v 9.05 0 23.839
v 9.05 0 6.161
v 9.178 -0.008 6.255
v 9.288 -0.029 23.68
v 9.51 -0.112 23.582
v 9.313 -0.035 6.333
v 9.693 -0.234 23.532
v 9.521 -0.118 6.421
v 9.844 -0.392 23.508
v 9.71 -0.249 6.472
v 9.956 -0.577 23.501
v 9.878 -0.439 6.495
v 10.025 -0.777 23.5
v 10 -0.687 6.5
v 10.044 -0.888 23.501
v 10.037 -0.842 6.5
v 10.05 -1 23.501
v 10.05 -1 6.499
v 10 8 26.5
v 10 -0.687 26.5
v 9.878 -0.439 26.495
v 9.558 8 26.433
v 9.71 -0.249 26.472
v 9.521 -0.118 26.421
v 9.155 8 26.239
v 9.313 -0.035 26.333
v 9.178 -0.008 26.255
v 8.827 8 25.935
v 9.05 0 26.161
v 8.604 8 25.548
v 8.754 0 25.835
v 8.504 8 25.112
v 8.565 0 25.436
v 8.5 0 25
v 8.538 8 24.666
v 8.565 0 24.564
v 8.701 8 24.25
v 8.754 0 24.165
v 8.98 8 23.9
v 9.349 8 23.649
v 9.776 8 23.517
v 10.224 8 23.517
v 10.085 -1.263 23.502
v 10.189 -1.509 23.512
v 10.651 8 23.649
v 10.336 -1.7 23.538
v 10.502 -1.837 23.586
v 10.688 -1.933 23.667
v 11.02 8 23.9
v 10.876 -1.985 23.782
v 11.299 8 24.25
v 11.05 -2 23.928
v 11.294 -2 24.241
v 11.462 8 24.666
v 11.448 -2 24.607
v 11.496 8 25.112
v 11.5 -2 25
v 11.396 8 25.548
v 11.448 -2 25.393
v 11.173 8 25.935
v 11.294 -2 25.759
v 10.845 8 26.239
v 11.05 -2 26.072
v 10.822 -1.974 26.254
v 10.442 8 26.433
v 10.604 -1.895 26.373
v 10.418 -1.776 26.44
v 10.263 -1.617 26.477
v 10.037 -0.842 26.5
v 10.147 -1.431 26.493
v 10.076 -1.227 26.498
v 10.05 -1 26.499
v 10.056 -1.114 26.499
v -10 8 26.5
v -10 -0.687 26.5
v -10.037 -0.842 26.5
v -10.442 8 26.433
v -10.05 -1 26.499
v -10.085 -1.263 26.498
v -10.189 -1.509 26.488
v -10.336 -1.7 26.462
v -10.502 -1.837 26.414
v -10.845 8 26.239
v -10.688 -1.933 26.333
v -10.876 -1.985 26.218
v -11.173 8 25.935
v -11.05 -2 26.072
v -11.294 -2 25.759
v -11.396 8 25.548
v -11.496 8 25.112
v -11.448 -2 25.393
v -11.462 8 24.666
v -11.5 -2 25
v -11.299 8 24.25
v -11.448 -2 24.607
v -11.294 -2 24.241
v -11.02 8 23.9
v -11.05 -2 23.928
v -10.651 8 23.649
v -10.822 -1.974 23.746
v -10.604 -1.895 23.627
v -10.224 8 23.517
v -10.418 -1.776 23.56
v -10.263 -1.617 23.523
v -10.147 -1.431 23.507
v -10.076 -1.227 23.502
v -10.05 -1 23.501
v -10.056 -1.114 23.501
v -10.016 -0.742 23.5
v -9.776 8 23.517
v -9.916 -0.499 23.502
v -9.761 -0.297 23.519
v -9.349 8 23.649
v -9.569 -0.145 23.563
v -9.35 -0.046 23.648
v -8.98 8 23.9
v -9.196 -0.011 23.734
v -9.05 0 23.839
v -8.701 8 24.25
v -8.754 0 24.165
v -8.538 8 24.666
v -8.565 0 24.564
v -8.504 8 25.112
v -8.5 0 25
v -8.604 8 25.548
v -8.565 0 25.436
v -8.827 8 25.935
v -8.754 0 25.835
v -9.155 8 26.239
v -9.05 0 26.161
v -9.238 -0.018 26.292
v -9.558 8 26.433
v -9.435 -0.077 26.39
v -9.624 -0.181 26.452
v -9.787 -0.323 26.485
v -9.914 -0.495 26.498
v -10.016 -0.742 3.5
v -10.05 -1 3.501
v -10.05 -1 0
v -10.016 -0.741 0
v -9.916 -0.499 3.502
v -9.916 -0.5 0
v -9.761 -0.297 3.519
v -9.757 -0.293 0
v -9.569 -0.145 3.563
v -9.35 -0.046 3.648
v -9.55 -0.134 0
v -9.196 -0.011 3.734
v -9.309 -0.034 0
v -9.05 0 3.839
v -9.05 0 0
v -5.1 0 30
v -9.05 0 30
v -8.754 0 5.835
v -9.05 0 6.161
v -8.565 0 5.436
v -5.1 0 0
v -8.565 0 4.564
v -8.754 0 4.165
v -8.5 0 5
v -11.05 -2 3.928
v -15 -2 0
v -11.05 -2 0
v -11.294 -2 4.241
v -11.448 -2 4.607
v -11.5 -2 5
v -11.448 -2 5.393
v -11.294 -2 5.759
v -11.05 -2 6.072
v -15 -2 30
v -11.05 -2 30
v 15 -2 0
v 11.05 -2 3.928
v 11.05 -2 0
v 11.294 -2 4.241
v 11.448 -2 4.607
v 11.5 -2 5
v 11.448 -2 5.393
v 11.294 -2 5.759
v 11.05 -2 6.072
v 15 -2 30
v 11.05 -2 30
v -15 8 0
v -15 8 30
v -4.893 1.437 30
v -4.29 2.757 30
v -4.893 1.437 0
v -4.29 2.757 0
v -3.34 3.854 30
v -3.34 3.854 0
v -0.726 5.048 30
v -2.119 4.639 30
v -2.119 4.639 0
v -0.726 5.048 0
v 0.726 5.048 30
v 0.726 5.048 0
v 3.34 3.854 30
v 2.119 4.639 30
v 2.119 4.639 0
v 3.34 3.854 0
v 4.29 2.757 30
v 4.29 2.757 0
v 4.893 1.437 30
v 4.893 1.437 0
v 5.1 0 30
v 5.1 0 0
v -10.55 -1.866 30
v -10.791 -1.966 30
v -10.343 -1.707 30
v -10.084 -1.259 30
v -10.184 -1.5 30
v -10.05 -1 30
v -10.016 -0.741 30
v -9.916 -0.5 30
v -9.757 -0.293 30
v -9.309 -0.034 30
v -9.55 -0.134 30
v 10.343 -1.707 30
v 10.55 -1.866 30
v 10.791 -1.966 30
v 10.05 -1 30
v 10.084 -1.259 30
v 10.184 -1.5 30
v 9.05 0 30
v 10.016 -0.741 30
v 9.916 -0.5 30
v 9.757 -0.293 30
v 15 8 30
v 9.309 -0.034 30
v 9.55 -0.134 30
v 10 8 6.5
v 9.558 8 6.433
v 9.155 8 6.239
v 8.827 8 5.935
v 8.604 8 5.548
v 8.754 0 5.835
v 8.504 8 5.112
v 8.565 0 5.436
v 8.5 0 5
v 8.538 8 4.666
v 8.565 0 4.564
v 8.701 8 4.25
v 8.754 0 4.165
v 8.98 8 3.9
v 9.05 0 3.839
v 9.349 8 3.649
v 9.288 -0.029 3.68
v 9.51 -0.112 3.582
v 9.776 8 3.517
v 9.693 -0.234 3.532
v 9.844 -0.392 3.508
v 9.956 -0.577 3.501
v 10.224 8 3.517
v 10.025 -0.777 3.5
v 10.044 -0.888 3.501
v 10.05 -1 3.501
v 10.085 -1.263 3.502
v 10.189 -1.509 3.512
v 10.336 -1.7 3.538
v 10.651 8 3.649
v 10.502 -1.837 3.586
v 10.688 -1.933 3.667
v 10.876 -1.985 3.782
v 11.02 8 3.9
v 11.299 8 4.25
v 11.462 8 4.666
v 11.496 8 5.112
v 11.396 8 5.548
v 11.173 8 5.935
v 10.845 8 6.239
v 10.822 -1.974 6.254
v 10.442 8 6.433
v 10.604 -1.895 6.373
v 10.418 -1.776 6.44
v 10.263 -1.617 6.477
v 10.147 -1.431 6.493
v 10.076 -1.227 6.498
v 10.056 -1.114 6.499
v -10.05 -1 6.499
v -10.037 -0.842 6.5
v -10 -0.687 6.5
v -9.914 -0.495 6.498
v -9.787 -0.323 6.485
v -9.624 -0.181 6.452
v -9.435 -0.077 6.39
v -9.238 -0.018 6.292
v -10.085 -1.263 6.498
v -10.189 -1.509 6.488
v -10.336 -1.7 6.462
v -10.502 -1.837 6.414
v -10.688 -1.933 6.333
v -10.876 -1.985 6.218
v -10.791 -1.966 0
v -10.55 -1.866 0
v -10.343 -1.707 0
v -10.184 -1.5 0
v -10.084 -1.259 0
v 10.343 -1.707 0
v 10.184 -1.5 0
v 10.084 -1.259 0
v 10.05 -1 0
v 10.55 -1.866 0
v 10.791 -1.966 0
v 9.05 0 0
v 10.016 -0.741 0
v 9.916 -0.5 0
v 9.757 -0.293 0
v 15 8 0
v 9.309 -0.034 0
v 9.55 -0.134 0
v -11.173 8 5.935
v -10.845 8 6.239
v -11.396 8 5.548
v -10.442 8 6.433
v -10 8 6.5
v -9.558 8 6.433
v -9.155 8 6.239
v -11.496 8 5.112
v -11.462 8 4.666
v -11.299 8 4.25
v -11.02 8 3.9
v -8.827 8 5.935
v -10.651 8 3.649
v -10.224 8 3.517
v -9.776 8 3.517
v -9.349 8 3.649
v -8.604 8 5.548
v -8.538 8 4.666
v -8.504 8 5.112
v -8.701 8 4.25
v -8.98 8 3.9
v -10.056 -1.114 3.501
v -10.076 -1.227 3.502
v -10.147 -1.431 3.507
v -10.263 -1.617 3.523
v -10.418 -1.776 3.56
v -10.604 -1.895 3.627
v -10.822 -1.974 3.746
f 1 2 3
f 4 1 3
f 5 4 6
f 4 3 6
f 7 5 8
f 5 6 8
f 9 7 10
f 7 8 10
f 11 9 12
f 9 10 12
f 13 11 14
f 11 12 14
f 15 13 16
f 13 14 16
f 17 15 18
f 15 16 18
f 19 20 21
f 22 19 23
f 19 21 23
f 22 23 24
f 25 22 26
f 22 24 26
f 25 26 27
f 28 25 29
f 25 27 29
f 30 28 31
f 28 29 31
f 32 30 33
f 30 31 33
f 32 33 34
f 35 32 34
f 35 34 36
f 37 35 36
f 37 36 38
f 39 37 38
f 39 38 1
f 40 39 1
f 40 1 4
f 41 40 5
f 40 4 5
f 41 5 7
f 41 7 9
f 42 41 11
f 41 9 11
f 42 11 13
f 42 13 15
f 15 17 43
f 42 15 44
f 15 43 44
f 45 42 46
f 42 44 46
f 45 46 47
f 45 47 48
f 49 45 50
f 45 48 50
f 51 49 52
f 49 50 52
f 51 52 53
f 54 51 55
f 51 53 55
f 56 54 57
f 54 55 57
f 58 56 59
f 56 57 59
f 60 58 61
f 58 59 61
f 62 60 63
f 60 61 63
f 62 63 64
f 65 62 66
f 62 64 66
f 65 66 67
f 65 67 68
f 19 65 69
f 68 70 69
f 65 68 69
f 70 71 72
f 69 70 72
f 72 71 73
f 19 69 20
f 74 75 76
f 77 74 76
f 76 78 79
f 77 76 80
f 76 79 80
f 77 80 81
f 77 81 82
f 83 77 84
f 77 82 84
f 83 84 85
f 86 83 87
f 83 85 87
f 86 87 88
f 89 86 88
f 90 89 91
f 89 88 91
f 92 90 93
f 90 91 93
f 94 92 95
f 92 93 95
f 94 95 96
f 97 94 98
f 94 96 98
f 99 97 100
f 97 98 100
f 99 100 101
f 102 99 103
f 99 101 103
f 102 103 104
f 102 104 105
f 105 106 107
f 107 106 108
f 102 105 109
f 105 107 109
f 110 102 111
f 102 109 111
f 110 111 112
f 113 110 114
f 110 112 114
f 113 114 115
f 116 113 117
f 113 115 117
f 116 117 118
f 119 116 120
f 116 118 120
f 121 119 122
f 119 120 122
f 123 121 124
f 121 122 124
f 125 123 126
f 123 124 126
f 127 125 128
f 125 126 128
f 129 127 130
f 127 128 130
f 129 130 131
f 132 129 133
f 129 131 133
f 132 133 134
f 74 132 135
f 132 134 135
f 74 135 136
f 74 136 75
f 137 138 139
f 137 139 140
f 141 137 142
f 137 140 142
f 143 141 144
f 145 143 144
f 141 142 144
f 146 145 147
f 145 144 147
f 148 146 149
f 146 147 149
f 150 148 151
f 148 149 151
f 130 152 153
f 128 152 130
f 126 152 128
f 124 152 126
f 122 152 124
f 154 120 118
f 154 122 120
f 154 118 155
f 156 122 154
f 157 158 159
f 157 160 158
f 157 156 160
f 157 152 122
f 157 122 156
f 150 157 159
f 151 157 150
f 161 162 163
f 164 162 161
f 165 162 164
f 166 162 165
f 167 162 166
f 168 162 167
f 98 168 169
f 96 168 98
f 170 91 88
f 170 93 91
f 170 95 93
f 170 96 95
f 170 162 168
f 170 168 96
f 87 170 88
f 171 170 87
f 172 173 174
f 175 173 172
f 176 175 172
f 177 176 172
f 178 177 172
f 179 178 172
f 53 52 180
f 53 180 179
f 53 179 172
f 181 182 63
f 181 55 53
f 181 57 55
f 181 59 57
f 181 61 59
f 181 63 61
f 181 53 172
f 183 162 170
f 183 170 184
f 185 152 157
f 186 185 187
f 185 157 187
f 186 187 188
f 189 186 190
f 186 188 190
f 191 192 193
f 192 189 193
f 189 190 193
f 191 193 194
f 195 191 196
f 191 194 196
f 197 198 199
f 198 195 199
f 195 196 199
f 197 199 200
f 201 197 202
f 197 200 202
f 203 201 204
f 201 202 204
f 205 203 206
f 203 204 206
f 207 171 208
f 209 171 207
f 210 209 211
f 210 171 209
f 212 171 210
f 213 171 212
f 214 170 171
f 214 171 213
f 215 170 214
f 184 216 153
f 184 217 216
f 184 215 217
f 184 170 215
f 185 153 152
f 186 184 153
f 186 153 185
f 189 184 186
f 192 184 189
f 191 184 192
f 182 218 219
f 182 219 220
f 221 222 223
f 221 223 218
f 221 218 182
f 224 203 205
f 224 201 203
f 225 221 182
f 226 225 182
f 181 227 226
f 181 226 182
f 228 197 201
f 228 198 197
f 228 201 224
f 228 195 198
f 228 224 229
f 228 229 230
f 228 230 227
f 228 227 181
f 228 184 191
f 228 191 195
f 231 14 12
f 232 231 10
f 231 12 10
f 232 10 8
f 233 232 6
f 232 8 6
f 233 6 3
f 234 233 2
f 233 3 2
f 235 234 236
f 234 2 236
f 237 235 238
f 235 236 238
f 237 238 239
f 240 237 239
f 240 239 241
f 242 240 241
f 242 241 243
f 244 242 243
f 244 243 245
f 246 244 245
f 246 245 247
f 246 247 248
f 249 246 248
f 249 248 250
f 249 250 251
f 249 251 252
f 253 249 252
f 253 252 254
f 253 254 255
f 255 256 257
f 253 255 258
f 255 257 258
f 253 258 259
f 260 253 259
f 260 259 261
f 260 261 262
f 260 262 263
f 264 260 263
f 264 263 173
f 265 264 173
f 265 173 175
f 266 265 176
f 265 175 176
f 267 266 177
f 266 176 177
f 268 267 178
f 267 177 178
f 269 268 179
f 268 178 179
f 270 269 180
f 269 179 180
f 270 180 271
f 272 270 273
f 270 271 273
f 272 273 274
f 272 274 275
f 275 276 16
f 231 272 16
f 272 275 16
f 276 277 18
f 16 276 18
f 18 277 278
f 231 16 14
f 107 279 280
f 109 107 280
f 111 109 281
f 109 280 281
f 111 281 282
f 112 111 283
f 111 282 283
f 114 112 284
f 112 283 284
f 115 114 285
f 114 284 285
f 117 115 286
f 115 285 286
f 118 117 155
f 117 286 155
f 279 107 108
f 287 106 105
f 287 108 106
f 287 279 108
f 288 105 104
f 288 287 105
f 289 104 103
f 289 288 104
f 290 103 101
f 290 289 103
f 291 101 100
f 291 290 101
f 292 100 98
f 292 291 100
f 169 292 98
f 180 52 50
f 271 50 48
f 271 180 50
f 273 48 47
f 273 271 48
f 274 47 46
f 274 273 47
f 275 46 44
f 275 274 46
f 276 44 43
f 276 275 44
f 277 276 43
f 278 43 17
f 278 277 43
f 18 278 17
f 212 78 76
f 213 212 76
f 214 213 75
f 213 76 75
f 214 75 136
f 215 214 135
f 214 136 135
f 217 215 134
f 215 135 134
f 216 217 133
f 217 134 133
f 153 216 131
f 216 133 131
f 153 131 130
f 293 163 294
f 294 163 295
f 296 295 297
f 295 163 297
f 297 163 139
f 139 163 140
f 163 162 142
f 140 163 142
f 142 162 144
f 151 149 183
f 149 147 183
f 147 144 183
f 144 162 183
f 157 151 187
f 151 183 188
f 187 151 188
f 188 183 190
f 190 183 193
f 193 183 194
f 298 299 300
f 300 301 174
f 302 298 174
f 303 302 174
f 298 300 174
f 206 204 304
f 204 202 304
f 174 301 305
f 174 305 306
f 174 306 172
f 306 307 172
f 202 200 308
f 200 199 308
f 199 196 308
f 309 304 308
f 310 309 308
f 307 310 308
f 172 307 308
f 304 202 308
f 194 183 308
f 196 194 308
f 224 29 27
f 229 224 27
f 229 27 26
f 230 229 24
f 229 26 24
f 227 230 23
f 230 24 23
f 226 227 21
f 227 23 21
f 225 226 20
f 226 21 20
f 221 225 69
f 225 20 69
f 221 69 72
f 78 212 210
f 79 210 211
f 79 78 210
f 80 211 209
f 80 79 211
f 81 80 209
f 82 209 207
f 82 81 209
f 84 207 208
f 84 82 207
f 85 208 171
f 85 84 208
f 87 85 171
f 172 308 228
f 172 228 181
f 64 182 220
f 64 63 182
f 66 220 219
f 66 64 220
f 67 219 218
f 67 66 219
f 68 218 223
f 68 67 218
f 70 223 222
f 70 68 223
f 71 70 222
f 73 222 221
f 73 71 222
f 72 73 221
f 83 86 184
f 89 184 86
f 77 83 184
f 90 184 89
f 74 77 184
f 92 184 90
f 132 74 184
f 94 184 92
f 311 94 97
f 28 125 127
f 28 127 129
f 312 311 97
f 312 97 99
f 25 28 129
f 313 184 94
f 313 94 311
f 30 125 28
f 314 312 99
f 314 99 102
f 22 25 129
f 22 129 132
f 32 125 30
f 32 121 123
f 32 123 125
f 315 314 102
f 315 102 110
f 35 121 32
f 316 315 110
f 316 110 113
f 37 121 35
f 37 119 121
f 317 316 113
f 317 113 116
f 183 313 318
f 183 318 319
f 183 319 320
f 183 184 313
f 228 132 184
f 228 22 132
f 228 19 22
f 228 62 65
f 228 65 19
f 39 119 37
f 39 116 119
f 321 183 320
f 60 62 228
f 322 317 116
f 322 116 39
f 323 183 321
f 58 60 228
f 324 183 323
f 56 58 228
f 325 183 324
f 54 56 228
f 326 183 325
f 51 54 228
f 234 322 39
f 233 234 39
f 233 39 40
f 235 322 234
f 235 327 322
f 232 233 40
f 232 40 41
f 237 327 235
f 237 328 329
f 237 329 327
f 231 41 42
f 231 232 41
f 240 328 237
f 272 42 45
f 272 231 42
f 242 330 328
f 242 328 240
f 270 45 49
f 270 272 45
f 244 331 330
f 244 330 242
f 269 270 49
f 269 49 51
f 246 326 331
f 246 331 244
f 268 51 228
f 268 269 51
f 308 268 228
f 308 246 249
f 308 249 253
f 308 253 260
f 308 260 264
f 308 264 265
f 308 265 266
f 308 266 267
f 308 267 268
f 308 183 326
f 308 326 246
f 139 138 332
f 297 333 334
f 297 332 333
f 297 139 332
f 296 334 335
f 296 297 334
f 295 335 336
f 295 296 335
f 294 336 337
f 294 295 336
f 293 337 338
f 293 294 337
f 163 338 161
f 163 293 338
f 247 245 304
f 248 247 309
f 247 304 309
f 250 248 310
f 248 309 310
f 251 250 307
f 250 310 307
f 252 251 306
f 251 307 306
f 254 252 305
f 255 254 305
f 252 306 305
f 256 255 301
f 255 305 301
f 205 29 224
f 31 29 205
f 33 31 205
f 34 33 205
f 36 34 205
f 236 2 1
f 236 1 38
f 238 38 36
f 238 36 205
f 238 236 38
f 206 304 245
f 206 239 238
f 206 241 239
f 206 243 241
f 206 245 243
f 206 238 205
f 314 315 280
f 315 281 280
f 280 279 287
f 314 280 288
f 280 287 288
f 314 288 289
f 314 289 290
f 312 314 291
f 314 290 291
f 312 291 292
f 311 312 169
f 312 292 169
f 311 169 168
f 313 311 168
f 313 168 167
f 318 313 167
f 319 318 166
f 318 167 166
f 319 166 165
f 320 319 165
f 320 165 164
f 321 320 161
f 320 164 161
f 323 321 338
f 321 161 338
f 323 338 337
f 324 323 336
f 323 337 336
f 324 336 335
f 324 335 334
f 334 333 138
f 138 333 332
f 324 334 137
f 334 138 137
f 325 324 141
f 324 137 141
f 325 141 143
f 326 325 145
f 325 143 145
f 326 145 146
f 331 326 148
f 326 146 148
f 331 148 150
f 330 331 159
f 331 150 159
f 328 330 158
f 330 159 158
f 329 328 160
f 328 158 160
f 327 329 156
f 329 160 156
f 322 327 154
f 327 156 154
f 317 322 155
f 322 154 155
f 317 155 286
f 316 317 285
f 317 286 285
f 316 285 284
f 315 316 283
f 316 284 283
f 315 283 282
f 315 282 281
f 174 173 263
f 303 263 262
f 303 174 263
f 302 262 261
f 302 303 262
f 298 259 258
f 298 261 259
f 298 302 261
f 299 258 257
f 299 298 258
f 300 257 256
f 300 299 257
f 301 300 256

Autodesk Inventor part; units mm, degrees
ref_plane "YZ Plane" through (0, 0, 0) normal (1, 0, 0) x (0, 1, 0)
ref_plane "XZ Plane" through (0, 0, 0) normal (0, 1, 0) x (-1, 0, 0)
ref_plane "XY Plane" through (0, 0, 0) normal (0, 0, 1) x (1, 0, 0)
sketch "スケッチ1" plane through (0, 0, 0) normal (0, 0, 1) x (1, 0, 0)
  arc A0 (-5.1, 0) -> (5.1, 0) centre (0, 0) ccw
  line L0 (-15, 8) -> (15, 8)
  line L1 (15, 8) -> (15, 0)
  line L2 (15, 0) -> (5.1, 0)
  line L3 (-15, 0) -> (-15, 8)
  arc A1 (5.1, 0) -> (-5.1, 0) centre (0, 0) ccw
  line L4 (5.1, 0) -> (-5.1, 0)
  line L5 (-5.1, 0) -> (-15, 0)
  dimension "d0" = 10.2
  dimension "d1" = 30
  dimension "d2" = 15
  dimension "d3" = 8
  dimension "d4" = 0
extrude "押し出し1" add sketch "スケッチ1" along normal blind 30 contours L5 L3 L0 L1 L2 A1
sketch "スケッチ2" plane through (-15, 0, 0) normal (0, -1, 0) x (1, 0, 0)
  line L0 (9.9, 30) -> (0, 30) projected
  line L1 (0, 0) -> (9.9, 0) projected
  line L2 (0, 30) -> (4.95, 30)
  line L3 (4.95, 30) -> (4.95, 0)
  line L4 (4.95, 0) -> (0, 0)
  line L5 (0, 0) -> (0, 30)
  line L6 (30, 30) -> (25.05, 30)
  line L7 (25.05, 30) -> (25.05, 0)
  line L8 (25.05, 0) -> (30, 0)
  line L9 (30, 0) -> (30, 30)
  point P0 (15, 0)
  dimension "d7" = 30
  dimension "d8" = 4.95
extrude "押し出し2" add sketch "スケッチ2" along normal blind 2
fillet "フィレット1" radius 1 4 edges at (-10.05, -2, 15) (-10.05, 0, 15) (10.05, 0, 15) (10.05, -2, 15)
sketch "スケッチ3" plane through (-15, 8, 0) normal (0, 1, 0) x (1, 0, 0)
  line L0 (0, -30) -> (30, -30) projected
  line L1 (30, 0) -> (30, -30) projected
  line L2 (30, 0) -> (0, 0) projected
  line L3 (0, 0) -> (0, -30) projected
  point P0 (15, 0)
  point P1 (5, -5)
  point P2 (5, -25)
  point P3 (25, -25)
  point P4 (25, -5)
  dimension "d11" = 5
  dimension "d12" = 5
  dimension "d13" = 5
  dimension "d14" = 5
  dimension "d15" = 5
  dimension "d16" = 5
  dimension "d17" = 5
  dimension "d18" = 5
hole "Hole2" at (-10, 8, 5) at (-10, 8, 25) at (10, 8, 25) at (10, 8, 5) direction (0, -1, 0) diameter 3 end through all
equation "\"d2\" = 0.5 * d1"
equation "\"d12\" = d11"
equation "\"d13\" = d11"
equation "\"d14\" = d13"
equation "\"d15\" = d11"
equation "\"d16\" = d11"
equation "\"d17\" = d11"
equation "\"d18\" = d11"
properties part number "poleHolderA"
